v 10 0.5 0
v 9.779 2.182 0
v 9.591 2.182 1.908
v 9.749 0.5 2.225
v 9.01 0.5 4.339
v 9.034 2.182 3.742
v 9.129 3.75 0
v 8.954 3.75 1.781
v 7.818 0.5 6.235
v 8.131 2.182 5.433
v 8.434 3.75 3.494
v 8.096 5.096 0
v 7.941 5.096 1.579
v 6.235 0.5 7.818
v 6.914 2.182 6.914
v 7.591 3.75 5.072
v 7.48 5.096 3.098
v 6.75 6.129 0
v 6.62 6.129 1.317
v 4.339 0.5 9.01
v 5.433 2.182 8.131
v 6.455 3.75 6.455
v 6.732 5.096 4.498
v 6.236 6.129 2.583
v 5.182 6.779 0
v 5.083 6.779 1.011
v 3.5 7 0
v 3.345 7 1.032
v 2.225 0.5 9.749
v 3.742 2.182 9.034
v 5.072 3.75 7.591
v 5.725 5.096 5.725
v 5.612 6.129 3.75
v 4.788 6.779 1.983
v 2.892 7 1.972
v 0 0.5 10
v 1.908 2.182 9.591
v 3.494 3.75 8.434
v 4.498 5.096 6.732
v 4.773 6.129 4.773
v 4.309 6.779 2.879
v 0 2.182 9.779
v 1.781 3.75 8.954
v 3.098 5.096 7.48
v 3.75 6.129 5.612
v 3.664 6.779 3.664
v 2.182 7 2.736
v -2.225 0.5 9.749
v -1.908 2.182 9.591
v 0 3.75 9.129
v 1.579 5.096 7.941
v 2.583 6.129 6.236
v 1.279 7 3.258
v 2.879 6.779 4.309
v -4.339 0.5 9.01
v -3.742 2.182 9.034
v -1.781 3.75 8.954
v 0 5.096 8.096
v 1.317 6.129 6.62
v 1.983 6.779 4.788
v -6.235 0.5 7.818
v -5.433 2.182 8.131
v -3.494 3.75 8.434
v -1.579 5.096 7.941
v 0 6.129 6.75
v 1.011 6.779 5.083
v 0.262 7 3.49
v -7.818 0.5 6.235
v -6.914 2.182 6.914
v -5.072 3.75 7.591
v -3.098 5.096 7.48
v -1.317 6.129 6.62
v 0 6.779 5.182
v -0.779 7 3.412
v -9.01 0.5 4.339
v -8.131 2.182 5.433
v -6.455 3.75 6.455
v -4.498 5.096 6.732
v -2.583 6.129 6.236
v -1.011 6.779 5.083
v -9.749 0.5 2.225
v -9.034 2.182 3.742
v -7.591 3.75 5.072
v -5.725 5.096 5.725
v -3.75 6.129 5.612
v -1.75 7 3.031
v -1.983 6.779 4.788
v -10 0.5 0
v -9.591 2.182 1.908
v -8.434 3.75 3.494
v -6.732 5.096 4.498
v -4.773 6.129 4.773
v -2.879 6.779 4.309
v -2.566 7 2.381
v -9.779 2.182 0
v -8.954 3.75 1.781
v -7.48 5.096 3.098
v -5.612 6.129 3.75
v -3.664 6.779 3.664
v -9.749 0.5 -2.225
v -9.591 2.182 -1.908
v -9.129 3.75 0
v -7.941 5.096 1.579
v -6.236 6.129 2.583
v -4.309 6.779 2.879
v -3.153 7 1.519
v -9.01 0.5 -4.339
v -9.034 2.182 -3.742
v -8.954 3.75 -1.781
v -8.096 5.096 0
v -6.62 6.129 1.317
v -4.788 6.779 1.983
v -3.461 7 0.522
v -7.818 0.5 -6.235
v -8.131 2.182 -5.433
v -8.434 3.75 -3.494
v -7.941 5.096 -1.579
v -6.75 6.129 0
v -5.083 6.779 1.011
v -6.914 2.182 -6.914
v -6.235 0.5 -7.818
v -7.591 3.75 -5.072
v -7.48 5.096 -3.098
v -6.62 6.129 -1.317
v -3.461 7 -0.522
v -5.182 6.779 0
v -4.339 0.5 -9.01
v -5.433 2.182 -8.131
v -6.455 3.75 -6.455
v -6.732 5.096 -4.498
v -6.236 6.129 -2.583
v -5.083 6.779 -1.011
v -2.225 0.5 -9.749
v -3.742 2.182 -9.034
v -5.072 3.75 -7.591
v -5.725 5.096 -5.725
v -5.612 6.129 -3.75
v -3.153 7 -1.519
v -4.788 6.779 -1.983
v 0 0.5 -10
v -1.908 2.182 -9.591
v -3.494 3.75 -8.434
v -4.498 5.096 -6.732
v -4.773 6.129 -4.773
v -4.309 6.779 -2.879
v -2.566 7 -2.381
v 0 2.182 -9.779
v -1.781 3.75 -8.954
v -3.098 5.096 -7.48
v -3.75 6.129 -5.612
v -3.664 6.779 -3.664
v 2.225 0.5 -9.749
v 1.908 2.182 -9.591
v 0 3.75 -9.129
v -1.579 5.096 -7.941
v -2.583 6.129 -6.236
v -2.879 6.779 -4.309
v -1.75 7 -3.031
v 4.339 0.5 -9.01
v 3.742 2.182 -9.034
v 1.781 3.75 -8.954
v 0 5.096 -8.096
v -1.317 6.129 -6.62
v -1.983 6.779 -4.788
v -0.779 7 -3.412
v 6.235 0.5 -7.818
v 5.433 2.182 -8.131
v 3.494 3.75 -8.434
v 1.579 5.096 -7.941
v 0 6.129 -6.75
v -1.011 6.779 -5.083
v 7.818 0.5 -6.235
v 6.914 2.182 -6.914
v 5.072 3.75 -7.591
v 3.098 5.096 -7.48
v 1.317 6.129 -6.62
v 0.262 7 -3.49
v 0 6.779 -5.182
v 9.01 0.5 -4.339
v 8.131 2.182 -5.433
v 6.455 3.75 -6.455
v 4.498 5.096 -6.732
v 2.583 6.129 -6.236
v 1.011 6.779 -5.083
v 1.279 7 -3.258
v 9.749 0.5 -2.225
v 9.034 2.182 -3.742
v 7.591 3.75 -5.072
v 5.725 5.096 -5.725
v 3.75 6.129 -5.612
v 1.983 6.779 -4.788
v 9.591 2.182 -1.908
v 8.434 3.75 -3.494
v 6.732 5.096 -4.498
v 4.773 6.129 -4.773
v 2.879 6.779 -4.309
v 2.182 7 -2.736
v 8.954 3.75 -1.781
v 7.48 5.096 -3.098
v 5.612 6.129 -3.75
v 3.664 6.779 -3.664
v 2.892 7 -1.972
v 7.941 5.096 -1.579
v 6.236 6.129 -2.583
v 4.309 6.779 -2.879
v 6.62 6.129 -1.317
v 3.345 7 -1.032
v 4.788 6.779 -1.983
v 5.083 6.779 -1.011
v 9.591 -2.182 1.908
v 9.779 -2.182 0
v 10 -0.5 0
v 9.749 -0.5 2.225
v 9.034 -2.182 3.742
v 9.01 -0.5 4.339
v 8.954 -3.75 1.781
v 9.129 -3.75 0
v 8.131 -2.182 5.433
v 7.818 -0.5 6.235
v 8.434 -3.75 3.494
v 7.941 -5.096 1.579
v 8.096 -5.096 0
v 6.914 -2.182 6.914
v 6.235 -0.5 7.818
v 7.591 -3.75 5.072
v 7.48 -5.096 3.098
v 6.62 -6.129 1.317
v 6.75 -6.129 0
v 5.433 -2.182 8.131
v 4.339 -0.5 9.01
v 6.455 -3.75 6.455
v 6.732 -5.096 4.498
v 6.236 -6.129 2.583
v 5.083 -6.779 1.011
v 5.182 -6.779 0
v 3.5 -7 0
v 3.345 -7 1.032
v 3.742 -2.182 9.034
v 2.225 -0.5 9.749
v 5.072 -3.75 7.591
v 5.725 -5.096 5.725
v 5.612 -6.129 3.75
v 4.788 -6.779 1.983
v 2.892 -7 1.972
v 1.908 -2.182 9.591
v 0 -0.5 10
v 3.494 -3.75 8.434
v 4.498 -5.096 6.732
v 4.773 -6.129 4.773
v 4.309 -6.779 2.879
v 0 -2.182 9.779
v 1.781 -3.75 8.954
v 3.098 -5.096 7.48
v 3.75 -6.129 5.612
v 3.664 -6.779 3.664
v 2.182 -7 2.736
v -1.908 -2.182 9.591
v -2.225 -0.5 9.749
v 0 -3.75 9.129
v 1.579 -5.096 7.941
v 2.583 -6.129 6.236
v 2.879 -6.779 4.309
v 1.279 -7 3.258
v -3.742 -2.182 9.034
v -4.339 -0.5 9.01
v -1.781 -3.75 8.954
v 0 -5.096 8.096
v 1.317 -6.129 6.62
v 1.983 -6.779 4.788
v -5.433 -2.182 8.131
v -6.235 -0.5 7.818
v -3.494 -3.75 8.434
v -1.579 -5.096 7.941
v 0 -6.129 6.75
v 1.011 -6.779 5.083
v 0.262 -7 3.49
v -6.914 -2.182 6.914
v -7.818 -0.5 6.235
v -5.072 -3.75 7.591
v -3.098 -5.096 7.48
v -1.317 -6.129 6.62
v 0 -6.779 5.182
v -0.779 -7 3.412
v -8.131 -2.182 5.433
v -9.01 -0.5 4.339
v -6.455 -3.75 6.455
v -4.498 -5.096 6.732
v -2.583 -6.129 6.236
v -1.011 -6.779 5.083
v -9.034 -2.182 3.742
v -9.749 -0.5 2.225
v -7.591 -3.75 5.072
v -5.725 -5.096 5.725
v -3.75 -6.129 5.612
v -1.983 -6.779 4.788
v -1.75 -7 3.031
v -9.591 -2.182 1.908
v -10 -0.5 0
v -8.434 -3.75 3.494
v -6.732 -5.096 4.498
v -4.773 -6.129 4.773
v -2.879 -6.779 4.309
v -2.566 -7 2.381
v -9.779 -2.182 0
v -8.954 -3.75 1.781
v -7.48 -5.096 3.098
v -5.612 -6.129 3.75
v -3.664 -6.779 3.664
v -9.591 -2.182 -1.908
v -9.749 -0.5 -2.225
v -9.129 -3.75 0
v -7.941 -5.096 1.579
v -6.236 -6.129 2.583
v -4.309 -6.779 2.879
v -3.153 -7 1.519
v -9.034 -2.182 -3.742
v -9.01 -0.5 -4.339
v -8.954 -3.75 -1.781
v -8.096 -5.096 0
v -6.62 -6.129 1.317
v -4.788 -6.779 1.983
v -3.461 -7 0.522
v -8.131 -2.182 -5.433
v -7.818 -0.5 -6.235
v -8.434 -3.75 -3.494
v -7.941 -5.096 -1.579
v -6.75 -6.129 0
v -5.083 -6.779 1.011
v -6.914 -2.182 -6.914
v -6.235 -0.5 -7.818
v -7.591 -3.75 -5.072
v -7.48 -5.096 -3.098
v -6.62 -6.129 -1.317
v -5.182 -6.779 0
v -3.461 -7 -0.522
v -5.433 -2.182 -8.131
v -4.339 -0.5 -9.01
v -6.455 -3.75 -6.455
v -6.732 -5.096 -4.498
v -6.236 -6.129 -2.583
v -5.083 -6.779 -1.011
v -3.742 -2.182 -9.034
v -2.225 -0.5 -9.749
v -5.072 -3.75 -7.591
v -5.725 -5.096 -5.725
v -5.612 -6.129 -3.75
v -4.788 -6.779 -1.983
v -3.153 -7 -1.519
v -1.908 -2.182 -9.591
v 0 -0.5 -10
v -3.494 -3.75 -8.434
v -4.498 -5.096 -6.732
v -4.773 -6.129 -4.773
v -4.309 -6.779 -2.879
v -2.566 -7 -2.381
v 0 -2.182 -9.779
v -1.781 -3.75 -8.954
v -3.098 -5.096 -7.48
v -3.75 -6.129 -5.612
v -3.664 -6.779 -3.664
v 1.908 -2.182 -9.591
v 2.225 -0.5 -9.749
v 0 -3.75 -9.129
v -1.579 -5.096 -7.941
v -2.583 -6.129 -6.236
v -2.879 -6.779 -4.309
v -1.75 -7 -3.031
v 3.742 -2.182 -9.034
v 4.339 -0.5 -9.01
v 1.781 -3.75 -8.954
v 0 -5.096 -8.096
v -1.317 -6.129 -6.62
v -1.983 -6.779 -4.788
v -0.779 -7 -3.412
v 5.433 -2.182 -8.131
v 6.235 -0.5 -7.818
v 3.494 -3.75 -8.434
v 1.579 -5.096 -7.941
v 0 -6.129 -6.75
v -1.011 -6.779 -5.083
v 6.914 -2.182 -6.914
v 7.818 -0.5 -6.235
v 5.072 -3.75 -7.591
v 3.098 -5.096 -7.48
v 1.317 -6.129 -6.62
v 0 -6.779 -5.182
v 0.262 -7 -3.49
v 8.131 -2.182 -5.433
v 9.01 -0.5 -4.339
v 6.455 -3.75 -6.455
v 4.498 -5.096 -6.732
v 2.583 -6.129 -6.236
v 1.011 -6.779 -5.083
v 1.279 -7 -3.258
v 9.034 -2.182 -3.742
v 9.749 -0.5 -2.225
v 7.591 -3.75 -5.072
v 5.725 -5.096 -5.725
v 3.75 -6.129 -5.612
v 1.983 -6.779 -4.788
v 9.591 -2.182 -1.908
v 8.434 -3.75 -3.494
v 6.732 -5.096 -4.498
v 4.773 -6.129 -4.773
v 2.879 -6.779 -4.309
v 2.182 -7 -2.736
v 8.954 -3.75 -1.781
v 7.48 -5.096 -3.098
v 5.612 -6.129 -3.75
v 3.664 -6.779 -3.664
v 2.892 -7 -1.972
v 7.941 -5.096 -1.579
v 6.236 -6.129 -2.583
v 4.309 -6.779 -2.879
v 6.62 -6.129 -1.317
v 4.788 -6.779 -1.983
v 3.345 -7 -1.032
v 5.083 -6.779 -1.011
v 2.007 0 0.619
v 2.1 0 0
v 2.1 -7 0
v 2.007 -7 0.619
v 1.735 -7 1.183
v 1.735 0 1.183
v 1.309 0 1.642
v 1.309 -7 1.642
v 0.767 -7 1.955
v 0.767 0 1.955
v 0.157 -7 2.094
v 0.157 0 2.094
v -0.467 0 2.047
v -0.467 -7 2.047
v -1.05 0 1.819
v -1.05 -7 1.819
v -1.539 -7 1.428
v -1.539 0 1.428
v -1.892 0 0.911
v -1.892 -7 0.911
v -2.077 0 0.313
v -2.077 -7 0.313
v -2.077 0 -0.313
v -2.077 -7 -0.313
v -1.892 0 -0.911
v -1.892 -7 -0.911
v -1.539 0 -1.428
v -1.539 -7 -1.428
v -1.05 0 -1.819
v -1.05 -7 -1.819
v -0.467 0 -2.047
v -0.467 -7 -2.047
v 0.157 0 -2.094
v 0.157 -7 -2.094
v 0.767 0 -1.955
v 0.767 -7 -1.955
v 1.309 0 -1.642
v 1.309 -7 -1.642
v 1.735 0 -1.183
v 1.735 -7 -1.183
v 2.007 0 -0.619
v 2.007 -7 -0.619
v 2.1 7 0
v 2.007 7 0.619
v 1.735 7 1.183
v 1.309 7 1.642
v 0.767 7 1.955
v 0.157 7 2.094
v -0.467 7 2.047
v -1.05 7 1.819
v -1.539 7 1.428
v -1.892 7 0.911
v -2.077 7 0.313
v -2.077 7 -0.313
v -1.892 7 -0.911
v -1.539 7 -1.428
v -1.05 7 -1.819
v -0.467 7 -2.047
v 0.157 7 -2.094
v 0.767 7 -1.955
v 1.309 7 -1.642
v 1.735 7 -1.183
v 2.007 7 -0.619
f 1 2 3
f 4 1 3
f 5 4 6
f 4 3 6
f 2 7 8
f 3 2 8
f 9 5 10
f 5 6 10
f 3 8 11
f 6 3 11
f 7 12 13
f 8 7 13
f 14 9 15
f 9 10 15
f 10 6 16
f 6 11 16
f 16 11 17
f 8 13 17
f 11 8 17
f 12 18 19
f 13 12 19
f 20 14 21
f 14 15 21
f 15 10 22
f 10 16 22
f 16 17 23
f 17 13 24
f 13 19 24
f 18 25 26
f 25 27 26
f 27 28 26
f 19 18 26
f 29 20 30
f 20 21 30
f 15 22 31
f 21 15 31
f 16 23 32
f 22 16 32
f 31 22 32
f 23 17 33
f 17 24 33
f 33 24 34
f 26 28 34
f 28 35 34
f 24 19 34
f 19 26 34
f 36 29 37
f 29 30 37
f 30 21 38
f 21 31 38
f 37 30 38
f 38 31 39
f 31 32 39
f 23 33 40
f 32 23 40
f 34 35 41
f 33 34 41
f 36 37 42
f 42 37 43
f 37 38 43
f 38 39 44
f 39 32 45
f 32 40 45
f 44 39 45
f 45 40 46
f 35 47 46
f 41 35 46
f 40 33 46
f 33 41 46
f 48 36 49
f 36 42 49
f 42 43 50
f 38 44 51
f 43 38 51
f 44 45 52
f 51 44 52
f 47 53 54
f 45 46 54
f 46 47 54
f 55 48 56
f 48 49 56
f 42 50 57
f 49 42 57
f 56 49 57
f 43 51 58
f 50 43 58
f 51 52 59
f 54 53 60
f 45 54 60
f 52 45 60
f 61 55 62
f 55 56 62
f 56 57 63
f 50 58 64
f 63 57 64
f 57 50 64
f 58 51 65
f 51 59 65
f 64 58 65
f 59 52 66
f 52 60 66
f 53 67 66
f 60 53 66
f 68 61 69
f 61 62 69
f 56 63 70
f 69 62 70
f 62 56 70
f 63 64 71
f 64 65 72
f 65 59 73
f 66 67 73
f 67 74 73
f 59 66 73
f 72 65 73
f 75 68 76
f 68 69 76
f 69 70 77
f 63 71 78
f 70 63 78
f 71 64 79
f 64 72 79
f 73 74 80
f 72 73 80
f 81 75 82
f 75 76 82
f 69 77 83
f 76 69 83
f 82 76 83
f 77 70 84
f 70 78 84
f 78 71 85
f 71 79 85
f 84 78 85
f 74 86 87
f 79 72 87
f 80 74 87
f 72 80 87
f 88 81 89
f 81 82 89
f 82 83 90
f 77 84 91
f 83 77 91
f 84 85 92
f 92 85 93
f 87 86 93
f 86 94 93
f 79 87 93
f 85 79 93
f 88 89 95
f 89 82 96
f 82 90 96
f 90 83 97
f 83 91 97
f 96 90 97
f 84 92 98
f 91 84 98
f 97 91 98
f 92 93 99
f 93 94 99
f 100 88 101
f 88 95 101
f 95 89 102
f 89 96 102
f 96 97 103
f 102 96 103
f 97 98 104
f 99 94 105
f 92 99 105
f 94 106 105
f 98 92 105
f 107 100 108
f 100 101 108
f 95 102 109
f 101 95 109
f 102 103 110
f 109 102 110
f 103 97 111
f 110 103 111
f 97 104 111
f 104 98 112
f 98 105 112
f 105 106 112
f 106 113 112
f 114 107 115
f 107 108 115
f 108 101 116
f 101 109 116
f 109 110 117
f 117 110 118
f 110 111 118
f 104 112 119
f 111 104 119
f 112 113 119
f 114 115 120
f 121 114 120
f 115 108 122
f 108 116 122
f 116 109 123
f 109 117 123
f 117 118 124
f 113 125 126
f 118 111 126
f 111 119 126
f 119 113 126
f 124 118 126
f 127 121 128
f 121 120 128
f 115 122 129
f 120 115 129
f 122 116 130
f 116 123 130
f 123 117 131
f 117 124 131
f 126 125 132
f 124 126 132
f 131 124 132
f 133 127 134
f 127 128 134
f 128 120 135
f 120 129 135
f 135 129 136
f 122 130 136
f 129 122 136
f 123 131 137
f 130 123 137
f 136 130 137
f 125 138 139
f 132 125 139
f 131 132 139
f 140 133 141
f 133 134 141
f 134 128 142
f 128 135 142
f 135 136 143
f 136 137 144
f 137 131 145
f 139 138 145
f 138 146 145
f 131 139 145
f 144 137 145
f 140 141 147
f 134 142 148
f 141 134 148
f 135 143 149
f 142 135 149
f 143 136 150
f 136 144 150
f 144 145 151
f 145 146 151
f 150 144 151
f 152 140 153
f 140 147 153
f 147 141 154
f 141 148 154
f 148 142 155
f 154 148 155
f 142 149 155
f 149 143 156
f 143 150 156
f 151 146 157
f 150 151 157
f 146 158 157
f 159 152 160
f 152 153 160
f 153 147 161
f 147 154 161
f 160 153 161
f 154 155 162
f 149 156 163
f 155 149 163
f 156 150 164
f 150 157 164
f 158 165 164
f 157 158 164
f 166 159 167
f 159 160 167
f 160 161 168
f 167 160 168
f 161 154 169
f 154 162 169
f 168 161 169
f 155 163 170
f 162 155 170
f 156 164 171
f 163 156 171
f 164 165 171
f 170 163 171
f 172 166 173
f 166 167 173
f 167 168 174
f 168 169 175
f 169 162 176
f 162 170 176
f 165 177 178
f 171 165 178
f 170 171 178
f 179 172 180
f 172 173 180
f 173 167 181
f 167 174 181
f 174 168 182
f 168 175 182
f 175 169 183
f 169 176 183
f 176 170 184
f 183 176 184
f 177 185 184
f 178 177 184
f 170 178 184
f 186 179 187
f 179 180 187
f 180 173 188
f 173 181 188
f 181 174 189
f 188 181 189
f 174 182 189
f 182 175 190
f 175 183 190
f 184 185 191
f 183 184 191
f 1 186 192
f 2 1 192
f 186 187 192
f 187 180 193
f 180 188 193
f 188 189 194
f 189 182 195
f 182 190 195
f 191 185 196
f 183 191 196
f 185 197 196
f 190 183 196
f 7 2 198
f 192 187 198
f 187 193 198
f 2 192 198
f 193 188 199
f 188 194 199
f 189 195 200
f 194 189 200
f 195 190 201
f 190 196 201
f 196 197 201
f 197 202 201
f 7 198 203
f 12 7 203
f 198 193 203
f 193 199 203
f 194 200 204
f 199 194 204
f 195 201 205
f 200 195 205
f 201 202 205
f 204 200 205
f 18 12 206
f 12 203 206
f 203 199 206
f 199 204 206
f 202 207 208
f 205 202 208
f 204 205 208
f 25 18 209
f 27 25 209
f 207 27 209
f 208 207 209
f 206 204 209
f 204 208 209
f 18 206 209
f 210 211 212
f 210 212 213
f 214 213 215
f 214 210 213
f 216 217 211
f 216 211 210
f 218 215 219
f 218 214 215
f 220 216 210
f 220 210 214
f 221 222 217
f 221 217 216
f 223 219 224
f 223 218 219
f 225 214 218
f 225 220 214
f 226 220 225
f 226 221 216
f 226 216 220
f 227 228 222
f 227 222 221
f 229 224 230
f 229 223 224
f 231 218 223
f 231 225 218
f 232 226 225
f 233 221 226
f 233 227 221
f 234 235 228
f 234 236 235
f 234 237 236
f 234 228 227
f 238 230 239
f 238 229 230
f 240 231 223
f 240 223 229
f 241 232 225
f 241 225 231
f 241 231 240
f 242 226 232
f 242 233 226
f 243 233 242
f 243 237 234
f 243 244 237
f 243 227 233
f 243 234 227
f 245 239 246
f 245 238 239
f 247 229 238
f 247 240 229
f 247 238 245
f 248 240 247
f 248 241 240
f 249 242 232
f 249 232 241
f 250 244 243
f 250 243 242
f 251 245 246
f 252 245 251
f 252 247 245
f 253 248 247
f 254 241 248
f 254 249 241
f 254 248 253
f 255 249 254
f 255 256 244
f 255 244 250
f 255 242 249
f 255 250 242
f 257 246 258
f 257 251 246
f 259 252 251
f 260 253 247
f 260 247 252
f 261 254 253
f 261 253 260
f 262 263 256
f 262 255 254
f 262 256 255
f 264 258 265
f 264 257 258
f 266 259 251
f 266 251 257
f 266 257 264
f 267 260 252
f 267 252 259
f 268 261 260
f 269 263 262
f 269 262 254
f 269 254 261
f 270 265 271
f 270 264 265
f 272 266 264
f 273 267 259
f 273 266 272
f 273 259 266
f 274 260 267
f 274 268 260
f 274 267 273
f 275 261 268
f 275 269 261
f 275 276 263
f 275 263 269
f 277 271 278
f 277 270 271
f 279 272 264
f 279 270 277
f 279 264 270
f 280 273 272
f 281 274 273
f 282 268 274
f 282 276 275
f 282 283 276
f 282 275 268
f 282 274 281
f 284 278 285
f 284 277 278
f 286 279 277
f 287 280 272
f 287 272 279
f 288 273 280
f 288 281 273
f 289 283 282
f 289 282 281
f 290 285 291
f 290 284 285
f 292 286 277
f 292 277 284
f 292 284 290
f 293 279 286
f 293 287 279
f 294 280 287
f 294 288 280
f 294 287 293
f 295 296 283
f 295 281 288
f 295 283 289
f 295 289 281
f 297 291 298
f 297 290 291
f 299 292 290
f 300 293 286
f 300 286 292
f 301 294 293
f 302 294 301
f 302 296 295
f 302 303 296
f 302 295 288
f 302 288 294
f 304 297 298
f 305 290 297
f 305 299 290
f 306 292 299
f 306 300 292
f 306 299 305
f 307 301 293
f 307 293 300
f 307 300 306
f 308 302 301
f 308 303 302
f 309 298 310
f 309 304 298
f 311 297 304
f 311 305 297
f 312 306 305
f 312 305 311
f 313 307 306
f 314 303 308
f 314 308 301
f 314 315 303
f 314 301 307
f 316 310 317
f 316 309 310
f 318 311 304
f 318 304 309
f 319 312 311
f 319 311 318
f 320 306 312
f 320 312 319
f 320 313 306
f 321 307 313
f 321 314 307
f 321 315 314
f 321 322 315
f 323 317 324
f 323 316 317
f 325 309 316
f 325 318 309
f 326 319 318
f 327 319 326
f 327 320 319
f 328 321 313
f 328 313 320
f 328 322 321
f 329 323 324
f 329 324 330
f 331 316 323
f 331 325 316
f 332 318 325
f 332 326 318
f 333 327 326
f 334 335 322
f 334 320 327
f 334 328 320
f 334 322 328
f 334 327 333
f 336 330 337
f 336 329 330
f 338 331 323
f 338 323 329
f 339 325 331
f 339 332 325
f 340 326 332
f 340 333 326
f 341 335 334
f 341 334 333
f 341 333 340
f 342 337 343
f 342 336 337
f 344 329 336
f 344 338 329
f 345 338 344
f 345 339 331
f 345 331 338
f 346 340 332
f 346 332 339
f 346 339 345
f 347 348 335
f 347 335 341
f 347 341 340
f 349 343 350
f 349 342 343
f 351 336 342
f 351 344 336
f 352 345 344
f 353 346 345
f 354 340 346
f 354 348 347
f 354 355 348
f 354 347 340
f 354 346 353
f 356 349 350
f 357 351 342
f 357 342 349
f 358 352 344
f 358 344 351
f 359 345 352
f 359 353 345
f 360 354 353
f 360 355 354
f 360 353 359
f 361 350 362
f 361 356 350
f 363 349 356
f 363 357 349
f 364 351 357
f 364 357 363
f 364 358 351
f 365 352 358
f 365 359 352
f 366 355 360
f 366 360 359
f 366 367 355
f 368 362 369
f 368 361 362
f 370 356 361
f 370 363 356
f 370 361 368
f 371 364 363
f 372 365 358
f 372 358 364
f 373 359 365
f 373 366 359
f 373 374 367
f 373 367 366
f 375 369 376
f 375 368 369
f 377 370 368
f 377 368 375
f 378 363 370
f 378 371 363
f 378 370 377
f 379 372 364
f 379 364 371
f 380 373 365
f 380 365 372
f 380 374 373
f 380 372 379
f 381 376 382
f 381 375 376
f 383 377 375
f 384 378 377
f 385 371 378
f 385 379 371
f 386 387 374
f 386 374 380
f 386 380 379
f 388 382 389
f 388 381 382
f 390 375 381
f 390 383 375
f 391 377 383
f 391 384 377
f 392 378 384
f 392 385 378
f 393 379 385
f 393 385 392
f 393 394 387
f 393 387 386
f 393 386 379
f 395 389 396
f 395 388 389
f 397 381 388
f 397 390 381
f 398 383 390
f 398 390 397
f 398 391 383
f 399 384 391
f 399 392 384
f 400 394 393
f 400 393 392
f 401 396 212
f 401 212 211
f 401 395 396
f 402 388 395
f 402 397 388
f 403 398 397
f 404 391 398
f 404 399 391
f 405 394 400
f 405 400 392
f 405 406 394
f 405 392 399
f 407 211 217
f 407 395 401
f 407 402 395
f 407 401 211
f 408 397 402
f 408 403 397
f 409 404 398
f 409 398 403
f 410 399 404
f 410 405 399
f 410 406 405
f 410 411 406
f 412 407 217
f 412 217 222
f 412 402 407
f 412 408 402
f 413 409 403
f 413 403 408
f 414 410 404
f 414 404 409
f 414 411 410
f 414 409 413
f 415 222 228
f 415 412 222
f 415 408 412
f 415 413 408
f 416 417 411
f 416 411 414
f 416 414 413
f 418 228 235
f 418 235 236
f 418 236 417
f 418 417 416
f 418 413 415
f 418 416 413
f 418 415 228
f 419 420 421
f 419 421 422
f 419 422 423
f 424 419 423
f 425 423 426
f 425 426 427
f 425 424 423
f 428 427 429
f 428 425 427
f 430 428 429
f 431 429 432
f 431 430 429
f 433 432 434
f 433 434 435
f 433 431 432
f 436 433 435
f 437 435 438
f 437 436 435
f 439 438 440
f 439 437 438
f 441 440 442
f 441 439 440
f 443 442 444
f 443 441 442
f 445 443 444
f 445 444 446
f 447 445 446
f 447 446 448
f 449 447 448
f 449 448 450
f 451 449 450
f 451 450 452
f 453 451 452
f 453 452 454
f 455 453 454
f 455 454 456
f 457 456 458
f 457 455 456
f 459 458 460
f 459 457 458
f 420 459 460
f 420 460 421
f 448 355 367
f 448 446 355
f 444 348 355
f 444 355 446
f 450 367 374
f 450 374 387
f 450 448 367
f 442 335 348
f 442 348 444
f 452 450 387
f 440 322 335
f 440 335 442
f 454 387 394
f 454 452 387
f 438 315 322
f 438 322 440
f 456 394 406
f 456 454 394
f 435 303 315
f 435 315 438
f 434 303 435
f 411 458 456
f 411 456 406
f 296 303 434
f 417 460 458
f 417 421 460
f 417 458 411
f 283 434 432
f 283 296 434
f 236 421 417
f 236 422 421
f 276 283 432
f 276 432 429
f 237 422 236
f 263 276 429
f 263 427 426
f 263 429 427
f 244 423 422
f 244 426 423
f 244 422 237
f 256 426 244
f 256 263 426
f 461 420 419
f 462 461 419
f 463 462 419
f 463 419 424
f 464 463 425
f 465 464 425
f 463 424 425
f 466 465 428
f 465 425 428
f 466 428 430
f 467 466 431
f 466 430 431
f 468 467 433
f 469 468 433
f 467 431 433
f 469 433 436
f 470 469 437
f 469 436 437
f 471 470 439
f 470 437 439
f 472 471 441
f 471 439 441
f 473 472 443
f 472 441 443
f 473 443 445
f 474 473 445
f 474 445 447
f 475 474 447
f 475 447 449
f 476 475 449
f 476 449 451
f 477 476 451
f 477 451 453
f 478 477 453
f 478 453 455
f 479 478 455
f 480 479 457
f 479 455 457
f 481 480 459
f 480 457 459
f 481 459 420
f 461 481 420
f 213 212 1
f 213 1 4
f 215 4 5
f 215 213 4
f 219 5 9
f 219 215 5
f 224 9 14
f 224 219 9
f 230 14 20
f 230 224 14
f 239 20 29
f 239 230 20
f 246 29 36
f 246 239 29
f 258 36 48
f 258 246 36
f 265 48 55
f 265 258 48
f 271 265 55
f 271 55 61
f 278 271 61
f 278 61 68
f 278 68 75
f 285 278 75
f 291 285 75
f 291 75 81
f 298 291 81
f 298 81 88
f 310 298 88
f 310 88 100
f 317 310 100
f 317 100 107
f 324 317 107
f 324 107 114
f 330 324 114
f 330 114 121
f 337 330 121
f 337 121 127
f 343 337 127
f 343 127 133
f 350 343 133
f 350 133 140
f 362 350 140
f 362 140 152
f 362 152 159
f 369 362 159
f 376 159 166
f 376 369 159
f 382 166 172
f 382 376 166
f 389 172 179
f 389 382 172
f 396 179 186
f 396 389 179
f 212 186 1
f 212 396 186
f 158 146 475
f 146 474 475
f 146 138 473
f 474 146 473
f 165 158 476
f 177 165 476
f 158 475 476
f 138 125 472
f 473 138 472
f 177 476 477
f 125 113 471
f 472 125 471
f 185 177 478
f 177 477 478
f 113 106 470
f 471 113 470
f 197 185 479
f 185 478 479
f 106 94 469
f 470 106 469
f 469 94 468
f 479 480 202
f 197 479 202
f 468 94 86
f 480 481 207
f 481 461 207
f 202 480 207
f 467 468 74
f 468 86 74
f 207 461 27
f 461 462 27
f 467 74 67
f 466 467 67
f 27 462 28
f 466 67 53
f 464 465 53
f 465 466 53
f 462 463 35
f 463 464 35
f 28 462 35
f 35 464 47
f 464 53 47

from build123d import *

# Parameters (mm, degrees)
F0_R          = 10
F0_R_2        = 2.1
F2_DEPTH      = 7
F2_DEPTH_BACK = 7
F3_R          = 6.5


# Not quite as in the source:
# - the program builds the solid bodies; features that only make, move or delete a surface that nothing else refers to are left out


with BuildPart() as f2:
    # F0 (on Front) → F2 (new body, two sides)
    with BuildSketch(Plane.XZ) as f2_sk:
        Circle(F0_R)
        Circle(F0_R_2, mode=Mode.SUBTRACT)
    extrude(amount=F2_DEPTH)
    extrude(f2_sk.sketch, amount=-F2_DEPTH_BACK)

    # F3
    f3_edges = [f2.edges().sort_by_distance(p)[0] for p in [
        (-10, -7, 0),
        (-10, 7, 0),
    ]]
    fillet(f3_edges, radius=F3_R)


solid = f2.part
